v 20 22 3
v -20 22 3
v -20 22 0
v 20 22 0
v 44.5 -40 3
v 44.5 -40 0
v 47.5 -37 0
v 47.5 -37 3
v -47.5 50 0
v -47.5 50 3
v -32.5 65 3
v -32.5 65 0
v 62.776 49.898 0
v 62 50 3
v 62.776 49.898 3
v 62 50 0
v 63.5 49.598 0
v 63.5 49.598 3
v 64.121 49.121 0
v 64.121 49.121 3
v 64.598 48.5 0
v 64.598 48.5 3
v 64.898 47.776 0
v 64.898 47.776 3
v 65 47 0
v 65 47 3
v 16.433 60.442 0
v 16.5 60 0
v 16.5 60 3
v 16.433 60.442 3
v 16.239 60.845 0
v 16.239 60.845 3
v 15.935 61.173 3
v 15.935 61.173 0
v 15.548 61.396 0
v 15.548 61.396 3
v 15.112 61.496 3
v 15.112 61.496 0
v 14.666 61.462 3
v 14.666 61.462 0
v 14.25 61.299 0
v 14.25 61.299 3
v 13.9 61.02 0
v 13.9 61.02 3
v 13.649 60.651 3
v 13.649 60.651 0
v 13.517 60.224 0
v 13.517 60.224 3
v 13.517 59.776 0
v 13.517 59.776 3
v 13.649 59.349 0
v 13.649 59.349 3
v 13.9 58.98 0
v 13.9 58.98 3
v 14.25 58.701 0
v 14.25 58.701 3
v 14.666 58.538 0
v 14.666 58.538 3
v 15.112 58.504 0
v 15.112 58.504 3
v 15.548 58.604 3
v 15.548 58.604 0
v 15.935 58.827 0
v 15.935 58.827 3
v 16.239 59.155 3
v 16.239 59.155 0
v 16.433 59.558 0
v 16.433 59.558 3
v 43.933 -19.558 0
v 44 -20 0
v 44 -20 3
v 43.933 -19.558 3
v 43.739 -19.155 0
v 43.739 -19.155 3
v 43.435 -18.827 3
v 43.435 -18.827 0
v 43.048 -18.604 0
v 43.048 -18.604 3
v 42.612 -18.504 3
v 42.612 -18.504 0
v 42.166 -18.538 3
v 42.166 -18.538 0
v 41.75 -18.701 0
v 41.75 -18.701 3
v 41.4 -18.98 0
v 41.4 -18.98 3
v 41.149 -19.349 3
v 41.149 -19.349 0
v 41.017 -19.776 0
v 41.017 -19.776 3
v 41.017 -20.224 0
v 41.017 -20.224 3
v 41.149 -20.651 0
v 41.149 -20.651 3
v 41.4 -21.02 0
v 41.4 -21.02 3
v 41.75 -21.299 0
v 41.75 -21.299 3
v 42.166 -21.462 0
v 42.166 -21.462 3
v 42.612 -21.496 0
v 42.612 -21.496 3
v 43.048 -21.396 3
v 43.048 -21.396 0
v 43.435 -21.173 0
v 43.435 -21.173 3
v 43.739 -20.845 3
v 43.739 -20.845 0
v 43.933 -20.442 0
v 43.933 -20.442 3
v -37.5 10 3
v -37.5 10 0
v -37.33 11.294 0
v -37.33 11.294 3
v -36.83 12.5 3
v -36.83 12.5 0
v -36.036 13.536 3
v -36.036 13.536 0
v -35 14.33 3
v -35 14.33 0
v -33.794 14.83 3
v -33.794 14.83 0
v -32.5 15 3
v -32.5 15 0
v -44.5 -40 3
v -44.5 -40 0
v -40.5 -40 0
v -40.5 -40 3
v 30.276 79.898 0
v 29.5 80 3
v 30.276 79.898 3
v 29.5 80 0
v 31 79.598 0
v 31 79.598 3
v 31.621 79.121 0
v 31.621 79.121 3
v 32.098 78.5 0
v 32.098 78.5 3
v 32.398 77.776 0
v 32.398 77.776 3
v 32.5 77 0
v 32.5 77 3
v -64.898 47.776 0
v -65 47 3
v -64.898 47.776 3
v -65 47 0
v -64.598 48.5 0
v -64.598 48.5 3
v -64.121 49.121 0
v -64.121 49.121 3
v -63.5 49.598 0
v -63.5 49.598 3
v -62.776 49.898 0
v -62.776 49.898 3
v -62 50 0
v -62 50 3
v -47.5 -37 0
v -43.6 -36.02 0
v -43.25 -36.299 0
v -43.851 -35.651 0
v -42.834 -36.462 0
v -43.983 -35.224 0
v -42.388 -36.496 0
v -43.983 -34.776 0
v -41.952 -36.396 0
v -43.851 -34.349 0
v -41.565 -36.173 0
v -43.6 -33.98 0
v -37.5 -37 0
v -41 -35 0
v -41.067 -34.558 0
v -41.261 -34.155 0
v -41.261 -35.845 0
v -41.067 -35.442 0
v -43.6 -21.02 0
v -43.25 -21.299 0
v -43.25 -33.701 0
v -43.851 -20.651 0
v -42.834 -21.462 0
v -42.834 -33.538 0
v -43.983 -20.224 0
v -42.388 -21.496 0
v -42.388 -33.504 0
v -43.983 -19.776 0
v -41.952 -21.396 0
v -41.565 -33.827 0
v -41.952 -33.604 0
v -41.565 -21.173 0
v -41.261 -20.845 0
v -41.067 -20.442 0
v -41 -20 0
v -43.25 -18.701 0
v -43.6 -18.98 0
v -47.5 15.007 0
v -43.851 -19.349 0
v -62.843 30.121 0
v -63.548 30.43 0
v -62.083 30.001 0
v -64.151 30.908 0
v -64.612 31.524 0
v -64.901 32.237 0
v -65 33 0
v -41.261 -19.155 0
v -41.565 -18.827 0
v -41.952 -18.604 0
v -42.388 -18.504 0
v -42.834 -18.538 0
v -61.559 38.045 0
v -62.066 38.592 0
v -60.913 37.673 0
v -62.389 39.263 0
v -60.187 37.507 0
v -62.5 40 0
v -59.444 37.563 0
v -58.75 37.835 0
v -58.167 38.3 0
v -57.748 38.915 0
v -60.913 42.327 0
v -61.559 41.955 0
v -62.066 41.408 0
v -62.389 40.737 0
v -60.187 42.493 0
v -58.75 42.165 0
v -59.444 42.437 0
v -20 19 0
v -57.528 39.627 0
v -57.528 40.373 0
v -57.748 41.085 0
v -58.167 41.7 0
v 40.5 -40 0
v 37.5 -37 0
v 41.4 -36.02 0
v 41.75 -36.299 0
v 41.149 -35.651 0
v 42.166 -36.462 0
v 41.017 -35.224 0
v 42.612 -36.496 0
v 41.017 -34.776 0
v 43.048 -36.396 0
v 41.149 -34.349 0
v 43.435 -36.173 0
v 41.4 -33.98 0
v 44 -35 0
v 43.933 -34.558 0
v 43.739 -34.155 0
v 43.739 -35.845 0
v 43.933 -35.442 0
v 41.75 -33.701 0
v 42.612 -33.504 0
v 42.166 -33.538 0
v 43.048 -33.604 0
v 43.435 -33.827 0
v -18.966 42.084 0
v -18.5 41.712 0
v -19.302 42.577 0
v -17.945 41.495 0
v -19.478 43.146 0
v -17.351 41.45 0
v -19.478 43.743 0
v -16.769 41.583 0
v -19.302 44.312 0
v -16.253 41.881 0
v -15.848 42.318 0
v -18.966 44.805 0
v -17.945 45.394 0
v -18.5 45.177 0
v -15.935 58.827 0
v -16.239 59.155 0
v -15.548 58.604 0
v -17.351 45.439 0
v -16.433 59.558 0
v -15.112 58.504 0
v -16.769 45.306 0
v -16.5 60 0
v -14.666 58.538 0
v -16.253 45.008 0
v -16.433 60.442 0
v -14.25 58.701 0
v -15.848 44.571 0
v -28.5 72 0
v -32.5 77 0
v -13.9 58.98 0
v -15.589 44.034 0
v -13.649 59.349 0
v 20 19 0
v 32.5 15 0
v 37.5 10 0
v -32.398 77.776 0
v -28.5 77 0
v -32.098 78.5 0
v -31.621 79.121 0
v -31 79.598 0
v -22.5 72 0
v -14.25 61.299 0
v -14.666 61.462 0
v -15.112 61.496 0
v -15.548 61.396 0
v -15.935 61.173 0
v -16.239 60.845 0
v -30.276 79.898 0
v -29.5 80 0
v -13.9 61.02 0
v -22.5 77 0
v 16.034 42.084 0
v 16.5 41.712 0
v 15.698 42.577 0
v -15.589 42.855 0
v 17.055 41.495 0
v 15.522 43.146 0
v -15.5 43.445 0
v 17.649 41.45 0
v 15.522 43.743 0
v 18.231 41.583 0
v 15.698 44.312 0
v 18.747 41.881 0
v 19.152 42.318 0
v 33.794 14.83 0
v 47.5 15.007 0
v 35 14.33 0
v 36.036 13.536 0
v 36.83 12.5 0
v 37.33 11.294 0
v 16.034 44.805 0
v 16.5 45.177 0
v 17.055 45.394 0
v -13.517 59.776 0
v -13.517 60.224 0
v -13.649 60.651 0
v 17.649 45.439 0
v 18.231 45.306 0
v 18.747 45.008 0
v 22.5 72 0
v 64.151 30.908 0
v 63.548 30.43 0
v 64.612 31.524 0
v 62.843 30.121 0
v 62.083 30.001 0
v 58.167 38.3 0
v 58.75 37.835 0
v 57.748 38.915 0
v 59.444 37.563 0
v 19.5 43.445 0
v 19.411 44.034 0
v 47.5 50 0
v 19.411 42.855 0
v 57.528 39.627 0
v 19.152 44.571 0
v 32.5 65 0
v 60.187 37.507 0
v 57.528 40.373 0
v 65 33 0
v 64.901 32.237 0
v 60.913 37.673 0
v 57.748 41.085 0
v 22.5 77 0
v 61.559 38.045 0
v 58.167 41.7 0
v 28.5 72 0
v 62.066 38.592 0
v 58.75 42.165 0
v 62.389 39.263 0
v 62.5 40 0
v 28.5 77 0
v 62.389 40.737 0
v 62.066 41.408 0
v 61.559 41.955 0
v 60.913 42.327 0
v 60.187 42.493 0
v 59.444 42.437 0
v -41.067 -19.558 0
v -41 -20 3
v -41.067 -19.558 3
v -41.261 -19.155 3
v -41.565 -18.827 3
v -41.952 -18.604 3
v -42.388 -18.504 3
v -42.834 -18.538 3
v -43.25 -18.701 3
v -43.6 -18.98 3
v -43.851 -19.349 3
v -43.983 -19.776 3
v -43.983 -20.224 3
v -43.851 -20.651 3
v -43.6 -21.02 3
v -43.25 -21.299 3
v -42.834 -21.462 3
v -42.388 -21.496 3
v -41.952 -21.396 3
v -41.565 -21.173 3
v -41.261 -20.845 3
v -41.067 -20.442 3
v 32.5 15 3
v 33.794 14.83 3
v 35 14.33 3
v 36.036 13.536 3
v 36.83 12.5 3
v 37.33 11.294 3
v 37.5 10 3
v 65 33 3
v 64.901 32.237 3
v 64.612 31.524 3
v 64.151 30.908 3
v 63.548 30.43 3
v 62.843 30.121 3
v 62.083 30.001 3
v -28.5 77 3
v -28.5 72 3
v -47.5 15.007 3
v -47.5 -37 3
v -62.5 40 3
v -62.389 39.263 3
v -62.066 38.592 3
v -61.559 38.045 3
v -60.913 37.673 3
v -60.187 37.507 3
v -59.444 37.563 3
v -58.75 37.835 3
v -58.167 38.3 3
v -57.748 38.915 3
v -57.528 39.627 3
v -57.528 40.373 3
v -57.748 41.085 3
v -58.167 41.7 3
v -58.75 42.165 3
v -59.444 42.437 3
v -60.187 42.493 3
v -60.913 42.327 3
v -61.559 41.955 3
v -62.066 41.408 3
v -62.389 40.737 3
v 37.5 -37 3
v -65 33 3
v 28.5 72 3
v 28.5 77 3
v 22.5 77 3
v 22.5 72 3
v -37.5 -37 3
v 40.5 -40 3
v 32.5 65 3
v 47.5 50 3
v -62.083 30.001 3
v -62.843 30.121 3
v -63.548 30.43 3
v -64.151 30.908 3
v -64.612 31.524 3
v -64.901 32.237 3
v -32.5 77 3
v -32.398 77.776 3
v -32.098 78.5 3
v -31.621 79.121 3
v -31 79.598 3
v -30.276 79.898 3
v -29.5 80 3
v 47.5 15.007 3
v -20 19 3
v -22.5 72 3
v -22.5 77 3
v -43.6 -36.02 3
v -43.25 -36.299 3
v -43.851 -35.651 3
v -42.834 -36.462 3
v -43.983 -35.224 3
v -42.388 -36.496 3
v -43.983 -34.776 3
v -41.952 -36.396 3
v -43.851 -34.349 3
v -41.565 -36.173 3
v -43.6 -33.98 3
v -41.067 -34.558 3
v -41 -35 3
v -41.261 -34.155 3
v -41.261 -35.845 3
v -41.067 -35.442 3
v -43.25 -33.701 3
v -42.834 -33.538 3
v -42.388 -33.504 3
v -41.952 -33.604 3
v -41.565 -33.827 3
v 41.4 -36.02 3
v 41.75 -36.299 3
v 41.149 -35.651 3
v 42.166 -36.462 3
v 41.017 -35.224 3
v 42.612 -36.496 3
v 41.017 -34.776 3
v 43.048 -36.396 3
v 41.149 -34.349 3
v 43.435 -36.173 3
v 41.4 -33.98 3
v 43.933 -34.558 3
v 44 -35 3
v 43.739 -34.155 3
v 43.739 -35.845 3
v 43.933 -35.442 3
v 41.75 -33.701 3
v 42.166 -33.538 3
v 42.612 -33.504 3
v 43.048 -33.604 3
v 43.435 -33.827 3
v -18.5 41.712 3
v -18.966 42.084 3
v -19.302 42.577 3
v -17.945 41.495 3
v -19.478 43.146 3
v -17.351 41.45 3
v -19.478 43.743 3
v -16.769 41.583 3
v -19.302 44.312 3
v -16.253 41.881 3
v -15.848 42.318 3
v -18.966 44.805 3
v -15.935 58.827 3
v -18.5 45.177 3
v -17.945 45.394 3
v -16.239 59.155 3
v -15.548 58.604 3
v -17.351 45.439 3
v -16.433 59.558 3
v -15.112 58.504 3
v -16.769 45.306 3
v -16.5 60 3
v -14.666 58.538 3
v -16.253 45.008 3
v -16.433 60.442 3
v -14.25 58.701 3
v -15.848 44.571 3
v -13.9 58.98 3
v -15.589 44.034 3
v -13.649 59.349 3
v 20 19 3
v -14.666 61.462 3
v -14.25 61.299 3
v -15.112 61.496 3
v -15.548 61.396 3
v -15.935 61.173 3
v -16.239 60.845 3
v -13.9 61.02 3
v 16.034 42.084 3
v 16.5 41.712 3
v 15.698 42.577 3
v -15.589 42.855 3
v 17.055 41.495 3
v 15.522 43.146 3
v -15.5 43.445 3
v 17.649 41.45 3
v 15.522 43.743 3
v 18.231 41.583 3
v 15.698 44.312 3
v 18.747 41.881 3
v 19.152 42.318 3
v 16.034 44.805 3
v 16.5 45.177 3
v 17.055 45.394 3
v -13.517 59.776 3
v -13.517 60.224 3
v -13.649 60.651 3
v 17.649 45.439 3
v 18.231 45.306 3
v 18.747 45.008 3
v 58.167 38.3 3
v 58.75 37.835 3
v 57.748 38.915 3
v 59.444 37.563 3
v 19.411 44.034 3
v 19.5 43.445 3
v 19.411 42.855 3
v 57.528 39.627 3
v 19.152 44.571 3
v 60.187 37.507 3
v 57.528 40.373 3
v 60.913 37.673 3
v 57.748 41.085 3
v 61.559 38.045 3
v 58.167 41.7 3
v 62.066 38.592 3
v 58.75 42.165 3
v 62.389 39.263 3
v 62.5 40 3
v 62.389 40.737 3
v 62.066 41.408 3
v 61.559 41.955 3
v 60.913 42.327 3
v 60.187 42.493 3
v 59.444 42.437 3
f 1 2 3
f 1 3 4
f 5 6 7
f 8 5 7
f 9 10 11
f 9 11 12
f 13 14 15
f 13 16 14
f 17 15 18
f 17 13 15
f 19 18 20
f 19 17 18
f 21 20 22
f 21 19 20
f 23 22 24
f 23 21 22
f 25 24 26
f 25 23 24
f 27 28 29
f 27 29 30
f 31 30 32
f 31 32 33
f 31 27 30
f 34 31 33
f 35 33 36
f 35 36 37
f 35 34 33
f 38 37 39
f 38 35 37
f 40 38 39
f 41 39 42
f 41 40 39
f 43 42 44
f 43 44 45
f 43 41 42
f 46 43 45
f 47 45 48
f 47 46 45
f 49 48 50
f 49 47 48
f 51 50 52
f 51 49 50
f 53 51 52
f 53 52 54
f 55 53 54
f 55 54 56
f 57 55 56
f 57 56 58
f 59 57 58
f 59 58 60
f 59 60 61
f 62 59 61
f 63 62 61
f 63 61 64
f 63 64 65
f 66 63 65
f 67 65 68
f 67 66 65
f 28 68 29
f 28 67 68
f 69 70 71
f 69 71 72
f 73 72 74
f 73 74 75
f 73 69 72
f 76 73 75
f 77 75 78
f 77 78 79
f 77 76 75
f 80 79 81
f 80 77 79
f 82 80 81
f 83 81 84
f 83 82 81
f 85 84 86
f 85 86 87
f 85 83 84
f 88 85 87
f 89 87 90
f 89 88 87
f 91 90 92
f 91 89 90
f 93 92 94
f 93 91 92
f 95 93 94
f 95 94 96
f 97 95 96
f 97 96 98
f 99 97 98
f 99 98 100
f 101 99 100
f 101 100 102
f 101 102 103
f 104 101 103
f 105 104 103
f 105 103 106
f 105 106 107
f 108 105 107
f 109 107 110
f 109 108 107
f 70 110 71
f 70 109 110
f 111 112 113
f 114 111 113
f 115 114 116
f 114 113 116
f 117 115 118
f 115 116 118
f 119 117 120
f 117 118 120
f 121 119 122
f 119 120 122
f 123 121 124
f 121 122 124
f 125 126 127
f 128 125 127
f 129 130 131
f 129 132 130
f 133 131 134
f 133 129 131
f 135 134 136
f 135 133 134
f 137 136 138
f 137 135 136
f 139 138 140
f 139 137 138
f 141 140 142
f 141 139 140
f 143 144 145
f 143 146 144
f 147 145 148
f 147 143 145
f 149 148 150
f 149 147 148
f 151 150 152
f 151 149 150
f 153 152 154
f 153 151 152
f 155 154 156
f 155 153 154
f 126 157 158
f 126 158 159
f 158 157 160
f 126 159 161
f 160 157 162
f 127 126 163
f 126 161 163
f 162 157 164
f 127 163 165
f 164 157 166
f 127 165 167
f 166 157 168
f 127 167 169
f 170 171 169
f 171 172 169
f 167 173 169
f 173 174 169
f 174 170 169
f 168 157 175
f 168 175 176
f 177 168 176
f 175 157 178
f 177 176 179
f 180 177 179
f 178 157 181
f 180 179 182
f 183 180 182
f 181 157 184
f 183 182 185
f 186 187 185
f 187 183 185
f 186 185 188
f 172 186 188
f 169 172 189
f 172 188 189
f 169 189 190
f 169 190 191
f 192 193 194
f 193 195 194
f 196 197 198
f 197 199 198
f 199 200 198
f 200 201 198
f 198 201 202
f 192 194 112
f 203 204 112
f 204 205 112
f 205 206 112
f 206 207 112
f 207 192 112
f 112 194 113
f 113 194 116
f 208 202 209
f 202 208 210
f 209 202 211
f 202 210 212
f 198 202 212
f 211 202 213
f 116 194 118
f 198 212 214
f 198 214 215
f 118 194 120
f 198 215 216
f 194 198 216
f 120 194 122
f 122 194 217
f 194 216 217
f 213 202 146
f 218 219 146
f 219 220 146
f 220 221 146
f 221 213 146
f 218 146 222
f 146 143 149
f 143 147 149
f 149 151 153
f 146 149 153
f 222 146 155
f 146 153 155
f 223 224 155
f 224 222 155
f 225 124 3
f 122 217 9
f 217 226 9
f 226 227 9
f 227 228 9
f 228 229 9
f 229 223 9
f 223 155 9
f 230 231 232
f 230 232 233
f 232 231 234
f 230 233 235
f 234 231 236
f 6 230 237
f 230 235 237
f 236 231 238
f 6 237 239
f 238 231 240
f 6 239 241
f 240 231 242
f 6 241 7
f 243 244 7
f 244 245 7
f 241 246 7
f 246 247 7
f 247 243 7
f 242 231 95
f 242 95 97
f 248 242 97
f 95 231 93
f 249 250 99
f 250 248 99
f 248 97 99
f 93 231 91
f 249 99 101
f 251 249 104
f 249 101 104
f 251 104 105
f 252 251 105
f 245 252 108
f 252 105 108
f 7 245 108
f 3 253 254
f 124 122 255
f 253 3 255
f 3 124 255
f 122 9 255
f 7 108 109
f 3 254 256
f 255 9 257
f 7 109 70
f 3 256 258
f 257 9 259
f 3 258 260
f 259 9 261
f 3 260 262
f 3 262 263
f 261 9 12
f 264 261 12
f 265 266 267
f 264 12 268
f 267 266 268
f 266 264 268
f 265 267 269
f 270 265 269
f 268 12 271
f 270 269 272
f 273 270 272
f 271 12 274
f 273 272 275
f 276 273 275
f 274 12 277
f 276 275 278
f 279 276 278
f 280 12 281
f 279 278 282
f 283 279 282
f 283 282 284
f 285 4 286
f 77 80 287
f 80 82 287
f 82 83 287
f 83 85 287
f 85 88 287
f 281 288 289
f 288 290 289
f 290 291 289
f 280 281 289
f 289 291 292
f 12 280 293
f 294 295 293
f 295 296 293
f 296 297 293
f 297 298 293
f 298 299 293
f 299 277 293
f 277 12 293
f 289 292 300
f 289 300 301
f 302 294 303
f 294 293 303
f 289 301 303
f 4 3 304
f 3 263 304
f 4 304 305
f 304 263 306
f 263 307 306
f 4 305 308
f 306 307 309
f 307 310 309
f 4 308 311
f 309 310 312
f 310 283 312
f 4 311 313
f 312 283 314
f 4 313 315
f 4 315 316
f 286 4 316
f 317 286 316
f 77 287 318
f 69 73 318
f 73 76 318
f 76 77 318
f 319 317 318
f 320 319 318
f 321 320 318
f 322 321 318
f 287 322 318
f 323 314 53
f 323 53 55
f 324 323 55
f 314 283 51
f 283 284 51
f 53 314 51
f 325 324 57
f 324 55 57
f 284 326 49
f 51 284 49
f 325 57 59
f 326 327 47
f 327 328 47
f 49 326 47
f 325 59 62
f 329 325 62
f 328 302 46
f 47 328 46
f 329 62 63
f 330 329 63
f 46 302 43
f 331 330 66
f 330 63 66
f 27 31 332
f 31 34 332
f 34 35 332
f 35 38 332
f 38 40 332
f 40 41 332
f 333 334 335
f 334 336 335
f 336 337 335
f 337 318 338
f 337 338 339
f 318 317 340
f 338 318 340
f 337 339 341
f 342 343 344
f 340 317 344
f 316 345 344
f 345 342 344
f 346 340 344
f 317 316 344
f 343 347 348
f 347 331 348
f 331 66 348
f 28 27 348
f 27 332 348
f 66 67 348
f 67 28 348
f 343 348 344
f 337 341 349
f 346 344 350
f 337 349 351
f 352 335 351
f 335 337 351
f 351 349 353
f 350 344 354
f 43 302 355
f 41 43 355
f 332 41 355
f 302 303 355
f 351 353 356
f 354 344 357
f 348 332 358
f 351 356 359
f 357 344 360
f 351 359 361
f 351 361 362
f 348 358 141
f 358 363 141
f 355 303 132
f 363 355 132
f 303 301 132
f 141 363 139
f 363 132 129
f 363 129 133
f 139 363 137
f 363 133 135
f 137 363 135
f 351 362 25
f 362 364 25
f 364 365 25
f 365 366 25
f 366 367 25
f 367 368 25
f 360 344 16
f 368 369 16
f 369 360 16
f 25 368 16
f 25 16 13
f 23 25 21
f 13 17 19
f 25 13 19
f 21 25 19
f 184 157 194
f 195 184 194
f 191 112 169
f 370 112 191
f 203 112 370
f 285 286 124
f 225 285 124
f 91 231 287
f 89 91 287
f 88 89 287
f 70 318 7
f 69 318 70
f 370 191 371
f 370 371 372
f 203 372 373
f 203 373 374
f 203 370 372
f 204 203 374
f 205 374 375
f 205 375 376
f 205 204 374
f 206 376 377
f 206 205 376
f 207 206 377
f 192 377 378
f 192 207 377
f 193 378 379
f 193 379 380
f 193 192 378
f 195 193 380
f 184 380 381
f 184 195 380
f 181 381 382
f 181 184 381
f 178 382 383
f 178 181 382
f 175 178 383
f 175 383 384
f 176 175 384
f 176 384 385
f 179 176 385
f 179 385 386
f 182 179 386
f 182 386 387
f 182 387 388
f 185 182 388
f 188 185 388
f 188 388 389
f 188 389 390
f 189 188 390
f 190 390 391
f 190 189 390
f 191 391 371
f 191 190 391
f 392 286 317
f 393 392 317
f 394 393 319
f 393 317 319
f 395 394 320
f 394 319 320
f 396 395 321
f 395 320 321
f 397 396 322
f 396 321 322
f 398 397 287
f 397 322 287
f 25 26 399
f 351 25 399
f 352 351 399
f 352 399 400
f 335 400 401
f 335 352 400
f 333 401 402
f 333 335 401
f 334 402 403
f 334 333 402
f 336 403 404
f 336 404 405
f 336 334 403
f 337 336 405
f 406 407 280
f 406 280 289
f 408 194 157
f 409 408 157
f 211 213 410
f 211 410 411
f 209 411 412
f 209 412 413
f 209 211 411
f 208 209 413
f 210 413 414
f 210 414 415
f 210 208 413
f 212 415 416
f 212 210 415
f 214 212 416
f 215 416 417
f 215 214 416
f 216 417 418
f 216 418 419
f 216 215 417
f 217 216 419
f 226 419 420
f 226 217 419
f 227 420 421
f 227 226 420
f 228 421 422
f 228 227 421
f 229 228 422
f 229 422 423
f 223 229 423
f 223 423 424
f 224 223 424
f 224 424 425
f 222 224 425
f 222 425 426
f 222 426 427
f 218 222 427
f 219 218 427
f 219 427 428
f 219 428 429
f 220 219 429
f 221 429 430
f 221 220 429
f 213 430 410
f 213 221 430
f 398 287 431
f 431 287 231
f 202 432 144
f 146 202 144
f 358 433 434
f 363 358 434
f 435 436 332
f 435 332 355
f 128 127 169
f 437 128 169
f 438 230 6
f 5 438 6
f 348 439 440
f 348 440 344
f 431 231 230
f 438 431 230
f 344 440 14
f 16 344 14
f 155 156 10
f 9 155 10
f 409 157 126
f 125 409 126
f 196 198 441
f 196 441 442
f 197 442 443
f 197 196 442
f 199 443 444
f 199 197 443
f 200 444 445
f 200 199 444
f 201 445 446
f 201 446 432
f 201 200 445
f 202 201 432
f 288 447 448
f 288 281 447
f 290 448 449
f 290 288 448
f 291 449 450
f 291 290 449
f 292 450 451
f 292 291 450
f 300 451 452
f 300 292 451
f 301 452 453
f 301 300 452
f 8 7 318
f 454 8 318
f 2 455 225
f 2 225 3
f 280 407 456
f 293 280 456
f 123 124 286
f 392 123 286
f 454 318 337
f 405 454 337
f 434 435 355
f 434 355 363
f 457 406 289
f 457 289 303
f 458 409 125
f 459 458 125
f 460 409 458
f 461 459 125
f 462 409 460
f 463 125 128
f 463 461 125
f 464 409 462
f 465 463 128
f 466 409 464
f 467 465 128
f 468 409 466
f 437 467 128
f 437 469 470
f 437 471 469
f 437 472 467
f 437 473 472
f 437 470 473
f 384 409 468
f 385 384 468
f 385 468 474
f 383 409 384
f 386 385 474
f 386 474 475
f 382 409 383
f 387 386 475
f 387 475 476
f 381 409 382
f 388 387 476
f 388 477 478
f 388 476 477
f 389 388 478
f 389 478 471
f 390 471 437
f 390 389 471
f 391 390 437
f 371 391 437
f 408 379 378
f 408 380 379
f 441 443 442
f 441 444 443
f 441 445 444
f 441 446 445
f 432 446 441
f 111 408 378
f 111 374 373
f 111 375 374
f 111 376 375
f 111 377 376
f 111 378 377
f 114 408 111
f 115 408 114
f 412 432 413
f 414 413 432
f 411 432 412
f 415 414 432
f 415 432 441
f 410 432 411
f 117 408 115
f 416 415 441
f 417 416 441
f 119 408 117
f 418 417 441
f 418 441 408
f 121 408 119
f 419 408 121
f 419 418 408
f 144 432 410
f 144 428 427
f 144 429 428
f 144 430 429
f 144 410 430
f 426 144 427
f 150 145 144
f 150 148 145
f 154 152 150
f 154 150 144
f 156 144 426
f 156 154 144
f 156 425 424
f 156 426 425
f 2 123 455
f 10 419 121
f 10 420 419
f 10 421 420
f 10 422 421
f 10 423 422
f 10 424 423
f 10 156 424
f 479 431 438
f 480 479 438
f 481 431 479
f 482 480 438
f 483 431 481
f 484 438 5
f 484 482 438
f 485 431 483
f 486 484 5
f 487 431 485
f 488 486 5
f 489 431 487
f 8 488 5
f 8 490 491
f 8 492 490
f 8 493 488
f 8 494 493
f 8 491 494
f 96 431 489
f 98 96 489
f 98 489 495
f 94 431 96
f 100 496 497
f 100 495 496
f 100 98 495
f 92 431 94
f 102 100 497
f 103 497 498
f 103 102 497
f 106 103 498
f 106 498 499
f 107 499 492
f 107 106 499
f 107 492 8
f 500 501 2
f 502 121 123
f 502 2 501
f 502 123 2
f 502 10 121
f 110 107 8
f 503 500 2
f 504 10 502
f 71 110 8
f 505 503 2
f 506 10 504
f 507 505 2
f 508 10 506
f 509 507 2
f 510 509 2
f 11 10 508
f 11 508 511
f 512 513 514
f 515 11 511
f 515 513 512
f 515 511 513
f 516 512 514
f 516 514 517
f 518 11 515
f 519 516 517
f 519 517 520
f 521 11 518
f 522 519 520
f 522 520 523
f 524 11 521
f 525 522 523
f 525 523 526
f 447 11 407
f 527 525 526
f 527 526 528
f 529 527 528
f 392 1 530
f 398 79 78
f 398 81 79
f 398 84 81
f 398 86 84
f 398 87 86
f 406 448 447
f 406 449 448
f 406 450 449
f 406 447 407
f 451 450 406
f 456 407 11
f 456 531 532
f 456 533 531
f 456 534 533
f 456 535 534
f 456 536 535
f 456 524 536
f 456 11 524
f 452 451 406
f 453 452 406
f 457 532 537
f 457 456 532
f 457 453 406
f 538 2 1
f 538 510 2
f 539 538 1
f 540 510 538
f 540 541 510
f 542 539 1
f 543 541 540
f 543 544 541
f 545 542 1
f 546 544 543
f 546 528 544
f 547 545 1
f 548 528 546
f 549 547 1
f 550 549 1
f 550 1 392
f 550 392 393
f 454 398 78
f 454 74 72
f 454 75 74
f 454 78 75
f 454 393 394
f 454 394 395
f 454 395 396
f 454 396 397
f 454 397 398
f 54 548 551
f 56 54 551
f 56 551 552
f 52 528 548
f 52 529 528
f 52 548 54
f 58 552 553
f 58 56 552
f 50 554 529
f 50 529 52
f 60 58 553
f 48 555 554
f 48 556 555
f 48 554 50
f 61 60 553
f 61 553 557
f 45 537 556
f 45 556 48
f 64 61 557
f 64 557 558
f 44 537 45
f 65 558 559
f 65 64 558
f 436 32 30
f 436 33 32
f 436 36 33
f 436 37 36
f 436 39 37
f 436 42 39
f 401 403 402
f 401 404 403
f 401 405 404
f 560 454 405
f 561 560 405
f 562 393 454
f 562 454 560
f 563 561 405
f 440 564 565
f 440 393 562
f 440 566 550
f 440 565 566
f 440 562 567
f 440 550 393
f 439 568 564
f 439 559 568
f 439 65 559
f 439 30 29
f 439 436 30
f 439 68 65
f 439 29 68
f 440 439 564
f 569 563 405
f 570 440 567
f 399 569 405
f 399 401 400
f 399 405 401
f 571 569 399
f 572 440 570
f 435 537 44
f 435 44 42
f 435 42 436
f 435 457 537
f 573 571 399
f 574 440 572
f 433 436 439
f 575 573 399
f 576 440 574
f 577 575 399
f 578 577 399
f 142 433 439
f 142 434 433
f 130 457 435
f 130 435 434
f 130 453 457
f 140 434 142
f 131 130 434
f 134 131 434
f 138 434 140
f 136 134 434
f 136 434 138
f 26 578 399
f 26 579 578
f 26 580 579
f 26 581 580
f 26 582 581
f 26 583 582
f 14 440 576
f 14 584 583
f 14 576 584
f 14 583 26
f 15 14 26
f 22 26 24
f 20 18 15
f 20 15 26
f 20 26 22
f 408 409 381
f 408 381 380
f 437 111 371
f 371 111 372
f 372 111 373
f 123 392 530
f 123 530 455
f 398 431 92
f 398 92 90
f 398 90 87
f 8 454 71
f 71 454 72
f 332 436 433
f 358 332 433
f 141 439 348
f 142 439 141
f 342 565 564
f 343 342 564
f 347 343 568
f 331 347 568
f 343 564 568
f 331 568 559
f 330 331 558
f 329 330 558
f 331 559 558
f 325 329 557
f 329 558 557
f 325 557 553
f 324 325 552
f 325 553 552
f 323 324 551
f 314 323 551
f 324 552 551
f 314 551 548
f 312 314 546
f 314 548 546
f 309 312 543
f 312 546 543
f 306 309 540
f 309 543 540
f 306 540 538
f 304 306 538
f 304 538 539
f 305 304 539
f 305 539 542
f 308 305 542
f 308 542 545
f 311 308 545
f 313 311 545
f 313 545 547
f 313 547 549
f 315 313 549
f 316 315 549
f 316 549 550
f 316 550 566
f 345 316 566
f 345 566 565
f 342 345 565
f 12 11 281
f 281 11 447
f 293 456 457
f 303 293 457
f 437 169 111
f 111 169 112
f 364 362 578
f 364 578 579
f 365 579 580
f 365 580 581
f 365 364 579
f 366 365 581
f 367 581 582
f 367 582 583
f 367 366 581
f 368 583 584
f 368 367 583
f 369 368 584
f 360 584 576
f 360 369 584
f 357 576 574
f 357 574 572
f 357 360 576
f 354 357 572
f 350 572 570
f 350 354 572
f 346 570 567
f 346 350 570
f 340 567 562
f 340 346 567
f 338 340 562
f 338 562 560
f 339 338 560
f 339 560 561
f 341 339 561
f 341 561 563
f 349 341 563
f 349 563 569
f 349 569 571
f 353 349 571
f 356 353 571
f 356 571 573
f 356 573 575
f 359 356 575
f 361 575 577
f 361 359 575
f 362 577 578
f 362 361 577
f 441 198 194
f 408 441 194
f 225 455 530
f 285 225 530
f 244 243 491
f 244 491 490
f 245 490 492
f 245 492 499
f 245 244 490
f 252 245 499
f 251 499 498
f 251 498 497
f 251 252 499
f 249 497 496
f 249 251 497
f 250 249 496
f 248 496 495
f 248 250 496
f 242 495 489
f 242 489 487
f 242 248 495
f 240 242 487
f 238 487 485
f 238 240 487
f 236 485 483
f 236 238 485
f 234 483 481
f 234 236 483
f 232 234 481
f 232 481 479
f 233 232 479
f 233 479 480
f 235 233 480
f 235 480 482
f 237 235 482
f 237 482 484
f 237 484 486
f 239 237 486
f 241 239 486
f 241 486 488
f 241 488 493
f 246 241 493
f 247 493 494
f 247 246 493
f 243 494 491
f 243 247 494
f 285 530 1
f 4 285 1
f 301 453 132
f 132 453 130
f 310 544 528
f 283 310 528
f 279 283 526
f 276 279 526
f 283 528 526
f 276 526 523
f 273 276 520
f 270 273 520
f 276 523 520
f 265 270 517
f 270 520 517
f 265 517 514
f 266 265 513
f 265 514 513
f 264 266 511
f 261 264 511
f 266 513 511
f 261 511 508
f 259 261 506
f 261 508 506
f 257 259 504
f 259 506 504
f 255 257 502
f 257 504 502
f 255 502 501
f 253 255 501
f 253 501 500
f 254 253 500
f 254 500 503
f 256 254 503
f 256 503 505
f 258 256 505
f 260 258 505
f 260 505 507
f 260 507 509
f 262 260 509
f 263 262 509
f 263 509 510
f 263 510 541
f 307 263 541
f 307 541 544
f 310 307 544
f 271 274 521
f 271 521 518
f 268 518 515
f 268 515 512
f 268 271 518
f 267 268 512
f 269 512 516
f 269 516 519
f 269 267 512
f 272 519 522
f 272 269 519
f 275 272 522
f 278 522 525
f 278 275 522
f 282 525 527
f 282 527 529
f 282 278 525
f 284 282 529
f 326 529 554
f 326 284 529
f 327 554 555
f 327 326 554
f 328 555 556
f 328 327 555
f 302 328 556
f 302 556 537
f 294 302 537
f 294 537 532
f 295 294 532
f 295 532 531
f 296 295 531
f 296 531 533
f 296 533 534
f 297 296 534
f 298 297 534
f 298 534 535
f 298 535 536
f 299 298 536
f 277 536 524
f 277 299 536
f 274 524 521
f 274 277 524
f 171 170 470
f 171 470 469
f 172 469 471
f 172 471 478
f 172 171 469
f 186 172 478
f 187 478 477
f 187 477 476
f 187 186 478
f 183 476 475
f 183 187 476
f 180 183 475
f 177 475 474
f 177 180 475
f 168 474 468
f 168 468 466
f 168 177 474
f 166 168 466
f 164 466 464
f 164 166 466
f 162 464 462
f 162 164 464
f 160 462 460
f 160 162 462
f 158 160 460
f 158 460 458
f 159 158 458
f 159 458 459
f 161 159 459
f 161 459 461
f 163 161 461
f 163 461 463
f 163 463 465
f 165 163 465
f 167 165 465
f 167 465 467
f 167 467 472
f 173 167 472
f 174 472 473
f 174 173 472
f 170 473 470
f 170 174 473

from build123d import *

# Parameters (mm, degrees)
SKETCH1_R           = 1.5
SKETCH1_R_2         = 2.5
BOSS_EXTRUDE1_DEPTH = 3
CUT_EXTRUDE1_DEPTH  = 3
FILLET1_R           = 3
CHAMFER4_SIZE       = 15
CHAMFER5_DEPTH      = 3
SKETCH8_R           = 2
CUT_EXTRUDE4_DEPTH  = 10
SKETCH10_W          = 65
SKETCH10_H          = 15
BOSS_EXTRUDE2_DEPTH = 3
SKETCH9_W           = 6
SKETCH9_H           = 5
CUT_EXTRUDE5_DEPTH  = 10
FILLET2_R           = 3
SKETCH11_W          = 40
SKETCH11_H          = 3
CUT_EXTRUDE6_DEPTH  = 10


with BuildPart() as part:
    # Sketch1 → Boss-Extrude1 (new body)
    with BuildSketch(Plane.XY):
        with BuildLine():
            Line((40.5, -40), (44.5, -40))
            Line((44.5, -40), (47.5, -37))
            Line((47.5, -37), (47.5, 10))
            Line((47.5, 10), (47.5, 15))
            Line((47.5, 15), (52.5, 15))
            Line((52.5, 15), (70, 15))
            ThreePointArc((70, 15), (73.535533906, 16.464466094), (75, 20))
            Line((75, 20), (75, 60))
            ThreePointArc((75, 60), (73.535533906, 63.535533906), (70, 65))
            Line((70, 65), (-70, 65))
            ThreePointArc((-70, 65), (-73.535533906, 63.535533906), (-75, 60))
            Line((-75, 60), (-75, 20))
            ThreePointArc((-75, 20), (-73.535533906, 16.464466094), (-70, 15))
            Line((-70, 15), (-52.5, 15))
            Line((-52.5, 15), (-47.5, 15))
            Line((-47.5, 15), (-47.5, 10))
            Line((-47.5, 10), (-47.5, -37))
            Line((-47.5, -37), (-44.5, -40))
            Line((-44.5, -40), (-40.5, -40))
            Line((-40.5, -40), (-37.5, -37))
            Line((-37.5, -37), (-37.5, 10))
            ThreePointArc((-37.5, 10), (-36.035533906, 13.535533906), (-32.5, 15))
            Line((-32.5, 15), (32.5, 15))
            ThreePointArc((32.5, 15), (36.035533906, 13.535533906), (37.5, 10))
            Line((37.5, 10), (37.5, -37))
            Line((37.5, -37), (40.5, -40))
        make_face()
        with Locations((-42.5, -20)):
            Circle(SKETCH1_R, mode=Mode.SUBTRACT)
        with Locations((-42.5, -35)):
            Circle(SKETCH1_R, mode=Mode.SUBTRACT)
        with Locations((42.5, -20)):
            Circle(SKETCH1_R, mode=Mode.SUBTRACT)
        with Locations((42.5, -35)):
            Circle(SKETCH1_R, mode=Mode.SUBTRACT)
        with Locations((60, 40)):
            Circle(SKETCH1_R_2, mode=Mode.SUBTRACT)
        with Locations((15, 60)):
            Circle(SKETCH1_R, mode=Mode.SUBTRACT)
        with Locations(Location((-15, 60, 0), (0, 0, 180))):
            Circle(SKETCH1_R, mode=Mode.SUBTRACT)
        with Locations(Location((-60, 40, 0), (0, 0, 180))):
            Circle(SKETCH1_R_2, mode=Mode.SUBTRACT)
    extrude(amount=BOSS_EXTRUDE1_DEPTH)

    # Sketch3 → Cut-Extrude1 (cut)
    with BuildSketch(Plane.XY.offset(3)):
        Polygon((65, 50), (65, 30), (47.5, 30), (47.5, 15), (75, 15), (75, 23.034767996), (75, 32.364095159), (75, 65), (47.5, 65), (47.5, 50), align=None)
        Polygon((-47.5, 65), (-75, 65), (-75, 32.364095159), (-75, 23.034767996), (-75, 15), (-47.5, 15), (-47.5, 30), (-65, 30), (-65, 50), (-47.5, 50), align=None)
    extrude(amount=-CUT_EXTRUDE1_DEPTH, mode=Mode.SUBTRACT)

    # Fillet1
    fillet1_edges = [part.edges().sort_by_distance(p)[0] for p in [
        (65, 50, 1.5),
        (65, 30, 1.5),
        (-65, 50, 1.5),
        (-65, 30, 1.5),
    ]]
    fillet(fillet1_edges, radius=FILLET1_R)

    # Chamfer4
    chamfer4_edges = [part.edges().sort_by_distance(p)[0] for p in [
        (47.5, 65, 1.5),
        (-47.5, 65, 1.5),
    ]]
    chamfer(chamfer4_edges, length=CHAMFER4_SIZE - 0.0001)  # a hair under: the kernel refuses the full size

    # Chamfer5: read off the stored shape, not the designer's step
    # Chamfer5 outline → Chamfer5 (add)
    with BuildSketch(Plane.XY):
        with BuildLine():
            Line((47.5, 15.006945785), (62.083333333, 30.001157631))
            ThreePointArc((62.083333333, 30.001157631), (62.041670687, 30.000289422), (62, 30))
            Line((62, 30), (47.5, 30))
            Line((47.5, 30), (47.5, 15.006945785))
        make_face()
        with BuildLine():
            Line((-62.083333333, 30.001157631), (-47.5, 15.006945785))
            Line((-47.5, 15.006945785), (-47.5, 30))
            Line((-47.5, 30), (-62, 30))
            ThreePointArc((-62, 30), (-62.041670687, 30.000289422), (-62.083333333, 30.001157631))
        make_face()
    extrude(amount=CHAMFER5_DEPTH)

    # Sketch8 → Cut-Extrude4 (cut)
    with BuildSketch(Plane.XY.offset(3)):
        with Locations((-17.5, 43.444515249)):
            Circle(SKETCH8_R)
        with Locations((17.5, 43.444515249)):
            Circle(SKETCH8_R)
    extrude(amount=-CUT_EXTRUDE4_DEPTH, mode=Mode.SUBTRACT)

    # Sketch10 → Boss-Extrude2 (add)
    with BuildSketch(Plane.XY.offset(3)):
        with Locations((0, 72.5)):
            Rectangle(SKETCH10_W, SKETCH10_H)
    extrude(amount=-BOSS_EXTRUDE2_DEPTH)

    # Sketch9 → Cut-Extrude5 (cut)
    with BuildSketch(Plane.XY.offset(3)):
        with Locations((-25.5, 74.5)):
            Rectangle(SKETCH9_W, SKETCH9_H)
        with Locations((25.5, 74.5)):
            Rectangle(SKETCH9_W, SKETCH9_H)
    extrude(amount=-CUT_EXTRUDE5_DEPTH, mode=Mode.SUBTRACT)

    # Fillet2
    fillet2_edges = [part.edges().sort_by_distance(p)[0] for p in [
        (-32.5, 80, 1.5),
        (32.5, 80, 1.5),
    ]]
    fillet(fillet2_edges, radius=FILLET2_R)

    # Sketch11 → Cut-Extrude6 (cut)
    with BuildSketch(Plane.XY.offset(3)):
        with Locations((0, 20.5)):
            Rectangle(SKETCH11_W, SKETCH11_H)
    extrude(amount=-CUT_EXTRUDE6_DEPTH, mode=Mode.SUBTRACT)


solid = part.part
